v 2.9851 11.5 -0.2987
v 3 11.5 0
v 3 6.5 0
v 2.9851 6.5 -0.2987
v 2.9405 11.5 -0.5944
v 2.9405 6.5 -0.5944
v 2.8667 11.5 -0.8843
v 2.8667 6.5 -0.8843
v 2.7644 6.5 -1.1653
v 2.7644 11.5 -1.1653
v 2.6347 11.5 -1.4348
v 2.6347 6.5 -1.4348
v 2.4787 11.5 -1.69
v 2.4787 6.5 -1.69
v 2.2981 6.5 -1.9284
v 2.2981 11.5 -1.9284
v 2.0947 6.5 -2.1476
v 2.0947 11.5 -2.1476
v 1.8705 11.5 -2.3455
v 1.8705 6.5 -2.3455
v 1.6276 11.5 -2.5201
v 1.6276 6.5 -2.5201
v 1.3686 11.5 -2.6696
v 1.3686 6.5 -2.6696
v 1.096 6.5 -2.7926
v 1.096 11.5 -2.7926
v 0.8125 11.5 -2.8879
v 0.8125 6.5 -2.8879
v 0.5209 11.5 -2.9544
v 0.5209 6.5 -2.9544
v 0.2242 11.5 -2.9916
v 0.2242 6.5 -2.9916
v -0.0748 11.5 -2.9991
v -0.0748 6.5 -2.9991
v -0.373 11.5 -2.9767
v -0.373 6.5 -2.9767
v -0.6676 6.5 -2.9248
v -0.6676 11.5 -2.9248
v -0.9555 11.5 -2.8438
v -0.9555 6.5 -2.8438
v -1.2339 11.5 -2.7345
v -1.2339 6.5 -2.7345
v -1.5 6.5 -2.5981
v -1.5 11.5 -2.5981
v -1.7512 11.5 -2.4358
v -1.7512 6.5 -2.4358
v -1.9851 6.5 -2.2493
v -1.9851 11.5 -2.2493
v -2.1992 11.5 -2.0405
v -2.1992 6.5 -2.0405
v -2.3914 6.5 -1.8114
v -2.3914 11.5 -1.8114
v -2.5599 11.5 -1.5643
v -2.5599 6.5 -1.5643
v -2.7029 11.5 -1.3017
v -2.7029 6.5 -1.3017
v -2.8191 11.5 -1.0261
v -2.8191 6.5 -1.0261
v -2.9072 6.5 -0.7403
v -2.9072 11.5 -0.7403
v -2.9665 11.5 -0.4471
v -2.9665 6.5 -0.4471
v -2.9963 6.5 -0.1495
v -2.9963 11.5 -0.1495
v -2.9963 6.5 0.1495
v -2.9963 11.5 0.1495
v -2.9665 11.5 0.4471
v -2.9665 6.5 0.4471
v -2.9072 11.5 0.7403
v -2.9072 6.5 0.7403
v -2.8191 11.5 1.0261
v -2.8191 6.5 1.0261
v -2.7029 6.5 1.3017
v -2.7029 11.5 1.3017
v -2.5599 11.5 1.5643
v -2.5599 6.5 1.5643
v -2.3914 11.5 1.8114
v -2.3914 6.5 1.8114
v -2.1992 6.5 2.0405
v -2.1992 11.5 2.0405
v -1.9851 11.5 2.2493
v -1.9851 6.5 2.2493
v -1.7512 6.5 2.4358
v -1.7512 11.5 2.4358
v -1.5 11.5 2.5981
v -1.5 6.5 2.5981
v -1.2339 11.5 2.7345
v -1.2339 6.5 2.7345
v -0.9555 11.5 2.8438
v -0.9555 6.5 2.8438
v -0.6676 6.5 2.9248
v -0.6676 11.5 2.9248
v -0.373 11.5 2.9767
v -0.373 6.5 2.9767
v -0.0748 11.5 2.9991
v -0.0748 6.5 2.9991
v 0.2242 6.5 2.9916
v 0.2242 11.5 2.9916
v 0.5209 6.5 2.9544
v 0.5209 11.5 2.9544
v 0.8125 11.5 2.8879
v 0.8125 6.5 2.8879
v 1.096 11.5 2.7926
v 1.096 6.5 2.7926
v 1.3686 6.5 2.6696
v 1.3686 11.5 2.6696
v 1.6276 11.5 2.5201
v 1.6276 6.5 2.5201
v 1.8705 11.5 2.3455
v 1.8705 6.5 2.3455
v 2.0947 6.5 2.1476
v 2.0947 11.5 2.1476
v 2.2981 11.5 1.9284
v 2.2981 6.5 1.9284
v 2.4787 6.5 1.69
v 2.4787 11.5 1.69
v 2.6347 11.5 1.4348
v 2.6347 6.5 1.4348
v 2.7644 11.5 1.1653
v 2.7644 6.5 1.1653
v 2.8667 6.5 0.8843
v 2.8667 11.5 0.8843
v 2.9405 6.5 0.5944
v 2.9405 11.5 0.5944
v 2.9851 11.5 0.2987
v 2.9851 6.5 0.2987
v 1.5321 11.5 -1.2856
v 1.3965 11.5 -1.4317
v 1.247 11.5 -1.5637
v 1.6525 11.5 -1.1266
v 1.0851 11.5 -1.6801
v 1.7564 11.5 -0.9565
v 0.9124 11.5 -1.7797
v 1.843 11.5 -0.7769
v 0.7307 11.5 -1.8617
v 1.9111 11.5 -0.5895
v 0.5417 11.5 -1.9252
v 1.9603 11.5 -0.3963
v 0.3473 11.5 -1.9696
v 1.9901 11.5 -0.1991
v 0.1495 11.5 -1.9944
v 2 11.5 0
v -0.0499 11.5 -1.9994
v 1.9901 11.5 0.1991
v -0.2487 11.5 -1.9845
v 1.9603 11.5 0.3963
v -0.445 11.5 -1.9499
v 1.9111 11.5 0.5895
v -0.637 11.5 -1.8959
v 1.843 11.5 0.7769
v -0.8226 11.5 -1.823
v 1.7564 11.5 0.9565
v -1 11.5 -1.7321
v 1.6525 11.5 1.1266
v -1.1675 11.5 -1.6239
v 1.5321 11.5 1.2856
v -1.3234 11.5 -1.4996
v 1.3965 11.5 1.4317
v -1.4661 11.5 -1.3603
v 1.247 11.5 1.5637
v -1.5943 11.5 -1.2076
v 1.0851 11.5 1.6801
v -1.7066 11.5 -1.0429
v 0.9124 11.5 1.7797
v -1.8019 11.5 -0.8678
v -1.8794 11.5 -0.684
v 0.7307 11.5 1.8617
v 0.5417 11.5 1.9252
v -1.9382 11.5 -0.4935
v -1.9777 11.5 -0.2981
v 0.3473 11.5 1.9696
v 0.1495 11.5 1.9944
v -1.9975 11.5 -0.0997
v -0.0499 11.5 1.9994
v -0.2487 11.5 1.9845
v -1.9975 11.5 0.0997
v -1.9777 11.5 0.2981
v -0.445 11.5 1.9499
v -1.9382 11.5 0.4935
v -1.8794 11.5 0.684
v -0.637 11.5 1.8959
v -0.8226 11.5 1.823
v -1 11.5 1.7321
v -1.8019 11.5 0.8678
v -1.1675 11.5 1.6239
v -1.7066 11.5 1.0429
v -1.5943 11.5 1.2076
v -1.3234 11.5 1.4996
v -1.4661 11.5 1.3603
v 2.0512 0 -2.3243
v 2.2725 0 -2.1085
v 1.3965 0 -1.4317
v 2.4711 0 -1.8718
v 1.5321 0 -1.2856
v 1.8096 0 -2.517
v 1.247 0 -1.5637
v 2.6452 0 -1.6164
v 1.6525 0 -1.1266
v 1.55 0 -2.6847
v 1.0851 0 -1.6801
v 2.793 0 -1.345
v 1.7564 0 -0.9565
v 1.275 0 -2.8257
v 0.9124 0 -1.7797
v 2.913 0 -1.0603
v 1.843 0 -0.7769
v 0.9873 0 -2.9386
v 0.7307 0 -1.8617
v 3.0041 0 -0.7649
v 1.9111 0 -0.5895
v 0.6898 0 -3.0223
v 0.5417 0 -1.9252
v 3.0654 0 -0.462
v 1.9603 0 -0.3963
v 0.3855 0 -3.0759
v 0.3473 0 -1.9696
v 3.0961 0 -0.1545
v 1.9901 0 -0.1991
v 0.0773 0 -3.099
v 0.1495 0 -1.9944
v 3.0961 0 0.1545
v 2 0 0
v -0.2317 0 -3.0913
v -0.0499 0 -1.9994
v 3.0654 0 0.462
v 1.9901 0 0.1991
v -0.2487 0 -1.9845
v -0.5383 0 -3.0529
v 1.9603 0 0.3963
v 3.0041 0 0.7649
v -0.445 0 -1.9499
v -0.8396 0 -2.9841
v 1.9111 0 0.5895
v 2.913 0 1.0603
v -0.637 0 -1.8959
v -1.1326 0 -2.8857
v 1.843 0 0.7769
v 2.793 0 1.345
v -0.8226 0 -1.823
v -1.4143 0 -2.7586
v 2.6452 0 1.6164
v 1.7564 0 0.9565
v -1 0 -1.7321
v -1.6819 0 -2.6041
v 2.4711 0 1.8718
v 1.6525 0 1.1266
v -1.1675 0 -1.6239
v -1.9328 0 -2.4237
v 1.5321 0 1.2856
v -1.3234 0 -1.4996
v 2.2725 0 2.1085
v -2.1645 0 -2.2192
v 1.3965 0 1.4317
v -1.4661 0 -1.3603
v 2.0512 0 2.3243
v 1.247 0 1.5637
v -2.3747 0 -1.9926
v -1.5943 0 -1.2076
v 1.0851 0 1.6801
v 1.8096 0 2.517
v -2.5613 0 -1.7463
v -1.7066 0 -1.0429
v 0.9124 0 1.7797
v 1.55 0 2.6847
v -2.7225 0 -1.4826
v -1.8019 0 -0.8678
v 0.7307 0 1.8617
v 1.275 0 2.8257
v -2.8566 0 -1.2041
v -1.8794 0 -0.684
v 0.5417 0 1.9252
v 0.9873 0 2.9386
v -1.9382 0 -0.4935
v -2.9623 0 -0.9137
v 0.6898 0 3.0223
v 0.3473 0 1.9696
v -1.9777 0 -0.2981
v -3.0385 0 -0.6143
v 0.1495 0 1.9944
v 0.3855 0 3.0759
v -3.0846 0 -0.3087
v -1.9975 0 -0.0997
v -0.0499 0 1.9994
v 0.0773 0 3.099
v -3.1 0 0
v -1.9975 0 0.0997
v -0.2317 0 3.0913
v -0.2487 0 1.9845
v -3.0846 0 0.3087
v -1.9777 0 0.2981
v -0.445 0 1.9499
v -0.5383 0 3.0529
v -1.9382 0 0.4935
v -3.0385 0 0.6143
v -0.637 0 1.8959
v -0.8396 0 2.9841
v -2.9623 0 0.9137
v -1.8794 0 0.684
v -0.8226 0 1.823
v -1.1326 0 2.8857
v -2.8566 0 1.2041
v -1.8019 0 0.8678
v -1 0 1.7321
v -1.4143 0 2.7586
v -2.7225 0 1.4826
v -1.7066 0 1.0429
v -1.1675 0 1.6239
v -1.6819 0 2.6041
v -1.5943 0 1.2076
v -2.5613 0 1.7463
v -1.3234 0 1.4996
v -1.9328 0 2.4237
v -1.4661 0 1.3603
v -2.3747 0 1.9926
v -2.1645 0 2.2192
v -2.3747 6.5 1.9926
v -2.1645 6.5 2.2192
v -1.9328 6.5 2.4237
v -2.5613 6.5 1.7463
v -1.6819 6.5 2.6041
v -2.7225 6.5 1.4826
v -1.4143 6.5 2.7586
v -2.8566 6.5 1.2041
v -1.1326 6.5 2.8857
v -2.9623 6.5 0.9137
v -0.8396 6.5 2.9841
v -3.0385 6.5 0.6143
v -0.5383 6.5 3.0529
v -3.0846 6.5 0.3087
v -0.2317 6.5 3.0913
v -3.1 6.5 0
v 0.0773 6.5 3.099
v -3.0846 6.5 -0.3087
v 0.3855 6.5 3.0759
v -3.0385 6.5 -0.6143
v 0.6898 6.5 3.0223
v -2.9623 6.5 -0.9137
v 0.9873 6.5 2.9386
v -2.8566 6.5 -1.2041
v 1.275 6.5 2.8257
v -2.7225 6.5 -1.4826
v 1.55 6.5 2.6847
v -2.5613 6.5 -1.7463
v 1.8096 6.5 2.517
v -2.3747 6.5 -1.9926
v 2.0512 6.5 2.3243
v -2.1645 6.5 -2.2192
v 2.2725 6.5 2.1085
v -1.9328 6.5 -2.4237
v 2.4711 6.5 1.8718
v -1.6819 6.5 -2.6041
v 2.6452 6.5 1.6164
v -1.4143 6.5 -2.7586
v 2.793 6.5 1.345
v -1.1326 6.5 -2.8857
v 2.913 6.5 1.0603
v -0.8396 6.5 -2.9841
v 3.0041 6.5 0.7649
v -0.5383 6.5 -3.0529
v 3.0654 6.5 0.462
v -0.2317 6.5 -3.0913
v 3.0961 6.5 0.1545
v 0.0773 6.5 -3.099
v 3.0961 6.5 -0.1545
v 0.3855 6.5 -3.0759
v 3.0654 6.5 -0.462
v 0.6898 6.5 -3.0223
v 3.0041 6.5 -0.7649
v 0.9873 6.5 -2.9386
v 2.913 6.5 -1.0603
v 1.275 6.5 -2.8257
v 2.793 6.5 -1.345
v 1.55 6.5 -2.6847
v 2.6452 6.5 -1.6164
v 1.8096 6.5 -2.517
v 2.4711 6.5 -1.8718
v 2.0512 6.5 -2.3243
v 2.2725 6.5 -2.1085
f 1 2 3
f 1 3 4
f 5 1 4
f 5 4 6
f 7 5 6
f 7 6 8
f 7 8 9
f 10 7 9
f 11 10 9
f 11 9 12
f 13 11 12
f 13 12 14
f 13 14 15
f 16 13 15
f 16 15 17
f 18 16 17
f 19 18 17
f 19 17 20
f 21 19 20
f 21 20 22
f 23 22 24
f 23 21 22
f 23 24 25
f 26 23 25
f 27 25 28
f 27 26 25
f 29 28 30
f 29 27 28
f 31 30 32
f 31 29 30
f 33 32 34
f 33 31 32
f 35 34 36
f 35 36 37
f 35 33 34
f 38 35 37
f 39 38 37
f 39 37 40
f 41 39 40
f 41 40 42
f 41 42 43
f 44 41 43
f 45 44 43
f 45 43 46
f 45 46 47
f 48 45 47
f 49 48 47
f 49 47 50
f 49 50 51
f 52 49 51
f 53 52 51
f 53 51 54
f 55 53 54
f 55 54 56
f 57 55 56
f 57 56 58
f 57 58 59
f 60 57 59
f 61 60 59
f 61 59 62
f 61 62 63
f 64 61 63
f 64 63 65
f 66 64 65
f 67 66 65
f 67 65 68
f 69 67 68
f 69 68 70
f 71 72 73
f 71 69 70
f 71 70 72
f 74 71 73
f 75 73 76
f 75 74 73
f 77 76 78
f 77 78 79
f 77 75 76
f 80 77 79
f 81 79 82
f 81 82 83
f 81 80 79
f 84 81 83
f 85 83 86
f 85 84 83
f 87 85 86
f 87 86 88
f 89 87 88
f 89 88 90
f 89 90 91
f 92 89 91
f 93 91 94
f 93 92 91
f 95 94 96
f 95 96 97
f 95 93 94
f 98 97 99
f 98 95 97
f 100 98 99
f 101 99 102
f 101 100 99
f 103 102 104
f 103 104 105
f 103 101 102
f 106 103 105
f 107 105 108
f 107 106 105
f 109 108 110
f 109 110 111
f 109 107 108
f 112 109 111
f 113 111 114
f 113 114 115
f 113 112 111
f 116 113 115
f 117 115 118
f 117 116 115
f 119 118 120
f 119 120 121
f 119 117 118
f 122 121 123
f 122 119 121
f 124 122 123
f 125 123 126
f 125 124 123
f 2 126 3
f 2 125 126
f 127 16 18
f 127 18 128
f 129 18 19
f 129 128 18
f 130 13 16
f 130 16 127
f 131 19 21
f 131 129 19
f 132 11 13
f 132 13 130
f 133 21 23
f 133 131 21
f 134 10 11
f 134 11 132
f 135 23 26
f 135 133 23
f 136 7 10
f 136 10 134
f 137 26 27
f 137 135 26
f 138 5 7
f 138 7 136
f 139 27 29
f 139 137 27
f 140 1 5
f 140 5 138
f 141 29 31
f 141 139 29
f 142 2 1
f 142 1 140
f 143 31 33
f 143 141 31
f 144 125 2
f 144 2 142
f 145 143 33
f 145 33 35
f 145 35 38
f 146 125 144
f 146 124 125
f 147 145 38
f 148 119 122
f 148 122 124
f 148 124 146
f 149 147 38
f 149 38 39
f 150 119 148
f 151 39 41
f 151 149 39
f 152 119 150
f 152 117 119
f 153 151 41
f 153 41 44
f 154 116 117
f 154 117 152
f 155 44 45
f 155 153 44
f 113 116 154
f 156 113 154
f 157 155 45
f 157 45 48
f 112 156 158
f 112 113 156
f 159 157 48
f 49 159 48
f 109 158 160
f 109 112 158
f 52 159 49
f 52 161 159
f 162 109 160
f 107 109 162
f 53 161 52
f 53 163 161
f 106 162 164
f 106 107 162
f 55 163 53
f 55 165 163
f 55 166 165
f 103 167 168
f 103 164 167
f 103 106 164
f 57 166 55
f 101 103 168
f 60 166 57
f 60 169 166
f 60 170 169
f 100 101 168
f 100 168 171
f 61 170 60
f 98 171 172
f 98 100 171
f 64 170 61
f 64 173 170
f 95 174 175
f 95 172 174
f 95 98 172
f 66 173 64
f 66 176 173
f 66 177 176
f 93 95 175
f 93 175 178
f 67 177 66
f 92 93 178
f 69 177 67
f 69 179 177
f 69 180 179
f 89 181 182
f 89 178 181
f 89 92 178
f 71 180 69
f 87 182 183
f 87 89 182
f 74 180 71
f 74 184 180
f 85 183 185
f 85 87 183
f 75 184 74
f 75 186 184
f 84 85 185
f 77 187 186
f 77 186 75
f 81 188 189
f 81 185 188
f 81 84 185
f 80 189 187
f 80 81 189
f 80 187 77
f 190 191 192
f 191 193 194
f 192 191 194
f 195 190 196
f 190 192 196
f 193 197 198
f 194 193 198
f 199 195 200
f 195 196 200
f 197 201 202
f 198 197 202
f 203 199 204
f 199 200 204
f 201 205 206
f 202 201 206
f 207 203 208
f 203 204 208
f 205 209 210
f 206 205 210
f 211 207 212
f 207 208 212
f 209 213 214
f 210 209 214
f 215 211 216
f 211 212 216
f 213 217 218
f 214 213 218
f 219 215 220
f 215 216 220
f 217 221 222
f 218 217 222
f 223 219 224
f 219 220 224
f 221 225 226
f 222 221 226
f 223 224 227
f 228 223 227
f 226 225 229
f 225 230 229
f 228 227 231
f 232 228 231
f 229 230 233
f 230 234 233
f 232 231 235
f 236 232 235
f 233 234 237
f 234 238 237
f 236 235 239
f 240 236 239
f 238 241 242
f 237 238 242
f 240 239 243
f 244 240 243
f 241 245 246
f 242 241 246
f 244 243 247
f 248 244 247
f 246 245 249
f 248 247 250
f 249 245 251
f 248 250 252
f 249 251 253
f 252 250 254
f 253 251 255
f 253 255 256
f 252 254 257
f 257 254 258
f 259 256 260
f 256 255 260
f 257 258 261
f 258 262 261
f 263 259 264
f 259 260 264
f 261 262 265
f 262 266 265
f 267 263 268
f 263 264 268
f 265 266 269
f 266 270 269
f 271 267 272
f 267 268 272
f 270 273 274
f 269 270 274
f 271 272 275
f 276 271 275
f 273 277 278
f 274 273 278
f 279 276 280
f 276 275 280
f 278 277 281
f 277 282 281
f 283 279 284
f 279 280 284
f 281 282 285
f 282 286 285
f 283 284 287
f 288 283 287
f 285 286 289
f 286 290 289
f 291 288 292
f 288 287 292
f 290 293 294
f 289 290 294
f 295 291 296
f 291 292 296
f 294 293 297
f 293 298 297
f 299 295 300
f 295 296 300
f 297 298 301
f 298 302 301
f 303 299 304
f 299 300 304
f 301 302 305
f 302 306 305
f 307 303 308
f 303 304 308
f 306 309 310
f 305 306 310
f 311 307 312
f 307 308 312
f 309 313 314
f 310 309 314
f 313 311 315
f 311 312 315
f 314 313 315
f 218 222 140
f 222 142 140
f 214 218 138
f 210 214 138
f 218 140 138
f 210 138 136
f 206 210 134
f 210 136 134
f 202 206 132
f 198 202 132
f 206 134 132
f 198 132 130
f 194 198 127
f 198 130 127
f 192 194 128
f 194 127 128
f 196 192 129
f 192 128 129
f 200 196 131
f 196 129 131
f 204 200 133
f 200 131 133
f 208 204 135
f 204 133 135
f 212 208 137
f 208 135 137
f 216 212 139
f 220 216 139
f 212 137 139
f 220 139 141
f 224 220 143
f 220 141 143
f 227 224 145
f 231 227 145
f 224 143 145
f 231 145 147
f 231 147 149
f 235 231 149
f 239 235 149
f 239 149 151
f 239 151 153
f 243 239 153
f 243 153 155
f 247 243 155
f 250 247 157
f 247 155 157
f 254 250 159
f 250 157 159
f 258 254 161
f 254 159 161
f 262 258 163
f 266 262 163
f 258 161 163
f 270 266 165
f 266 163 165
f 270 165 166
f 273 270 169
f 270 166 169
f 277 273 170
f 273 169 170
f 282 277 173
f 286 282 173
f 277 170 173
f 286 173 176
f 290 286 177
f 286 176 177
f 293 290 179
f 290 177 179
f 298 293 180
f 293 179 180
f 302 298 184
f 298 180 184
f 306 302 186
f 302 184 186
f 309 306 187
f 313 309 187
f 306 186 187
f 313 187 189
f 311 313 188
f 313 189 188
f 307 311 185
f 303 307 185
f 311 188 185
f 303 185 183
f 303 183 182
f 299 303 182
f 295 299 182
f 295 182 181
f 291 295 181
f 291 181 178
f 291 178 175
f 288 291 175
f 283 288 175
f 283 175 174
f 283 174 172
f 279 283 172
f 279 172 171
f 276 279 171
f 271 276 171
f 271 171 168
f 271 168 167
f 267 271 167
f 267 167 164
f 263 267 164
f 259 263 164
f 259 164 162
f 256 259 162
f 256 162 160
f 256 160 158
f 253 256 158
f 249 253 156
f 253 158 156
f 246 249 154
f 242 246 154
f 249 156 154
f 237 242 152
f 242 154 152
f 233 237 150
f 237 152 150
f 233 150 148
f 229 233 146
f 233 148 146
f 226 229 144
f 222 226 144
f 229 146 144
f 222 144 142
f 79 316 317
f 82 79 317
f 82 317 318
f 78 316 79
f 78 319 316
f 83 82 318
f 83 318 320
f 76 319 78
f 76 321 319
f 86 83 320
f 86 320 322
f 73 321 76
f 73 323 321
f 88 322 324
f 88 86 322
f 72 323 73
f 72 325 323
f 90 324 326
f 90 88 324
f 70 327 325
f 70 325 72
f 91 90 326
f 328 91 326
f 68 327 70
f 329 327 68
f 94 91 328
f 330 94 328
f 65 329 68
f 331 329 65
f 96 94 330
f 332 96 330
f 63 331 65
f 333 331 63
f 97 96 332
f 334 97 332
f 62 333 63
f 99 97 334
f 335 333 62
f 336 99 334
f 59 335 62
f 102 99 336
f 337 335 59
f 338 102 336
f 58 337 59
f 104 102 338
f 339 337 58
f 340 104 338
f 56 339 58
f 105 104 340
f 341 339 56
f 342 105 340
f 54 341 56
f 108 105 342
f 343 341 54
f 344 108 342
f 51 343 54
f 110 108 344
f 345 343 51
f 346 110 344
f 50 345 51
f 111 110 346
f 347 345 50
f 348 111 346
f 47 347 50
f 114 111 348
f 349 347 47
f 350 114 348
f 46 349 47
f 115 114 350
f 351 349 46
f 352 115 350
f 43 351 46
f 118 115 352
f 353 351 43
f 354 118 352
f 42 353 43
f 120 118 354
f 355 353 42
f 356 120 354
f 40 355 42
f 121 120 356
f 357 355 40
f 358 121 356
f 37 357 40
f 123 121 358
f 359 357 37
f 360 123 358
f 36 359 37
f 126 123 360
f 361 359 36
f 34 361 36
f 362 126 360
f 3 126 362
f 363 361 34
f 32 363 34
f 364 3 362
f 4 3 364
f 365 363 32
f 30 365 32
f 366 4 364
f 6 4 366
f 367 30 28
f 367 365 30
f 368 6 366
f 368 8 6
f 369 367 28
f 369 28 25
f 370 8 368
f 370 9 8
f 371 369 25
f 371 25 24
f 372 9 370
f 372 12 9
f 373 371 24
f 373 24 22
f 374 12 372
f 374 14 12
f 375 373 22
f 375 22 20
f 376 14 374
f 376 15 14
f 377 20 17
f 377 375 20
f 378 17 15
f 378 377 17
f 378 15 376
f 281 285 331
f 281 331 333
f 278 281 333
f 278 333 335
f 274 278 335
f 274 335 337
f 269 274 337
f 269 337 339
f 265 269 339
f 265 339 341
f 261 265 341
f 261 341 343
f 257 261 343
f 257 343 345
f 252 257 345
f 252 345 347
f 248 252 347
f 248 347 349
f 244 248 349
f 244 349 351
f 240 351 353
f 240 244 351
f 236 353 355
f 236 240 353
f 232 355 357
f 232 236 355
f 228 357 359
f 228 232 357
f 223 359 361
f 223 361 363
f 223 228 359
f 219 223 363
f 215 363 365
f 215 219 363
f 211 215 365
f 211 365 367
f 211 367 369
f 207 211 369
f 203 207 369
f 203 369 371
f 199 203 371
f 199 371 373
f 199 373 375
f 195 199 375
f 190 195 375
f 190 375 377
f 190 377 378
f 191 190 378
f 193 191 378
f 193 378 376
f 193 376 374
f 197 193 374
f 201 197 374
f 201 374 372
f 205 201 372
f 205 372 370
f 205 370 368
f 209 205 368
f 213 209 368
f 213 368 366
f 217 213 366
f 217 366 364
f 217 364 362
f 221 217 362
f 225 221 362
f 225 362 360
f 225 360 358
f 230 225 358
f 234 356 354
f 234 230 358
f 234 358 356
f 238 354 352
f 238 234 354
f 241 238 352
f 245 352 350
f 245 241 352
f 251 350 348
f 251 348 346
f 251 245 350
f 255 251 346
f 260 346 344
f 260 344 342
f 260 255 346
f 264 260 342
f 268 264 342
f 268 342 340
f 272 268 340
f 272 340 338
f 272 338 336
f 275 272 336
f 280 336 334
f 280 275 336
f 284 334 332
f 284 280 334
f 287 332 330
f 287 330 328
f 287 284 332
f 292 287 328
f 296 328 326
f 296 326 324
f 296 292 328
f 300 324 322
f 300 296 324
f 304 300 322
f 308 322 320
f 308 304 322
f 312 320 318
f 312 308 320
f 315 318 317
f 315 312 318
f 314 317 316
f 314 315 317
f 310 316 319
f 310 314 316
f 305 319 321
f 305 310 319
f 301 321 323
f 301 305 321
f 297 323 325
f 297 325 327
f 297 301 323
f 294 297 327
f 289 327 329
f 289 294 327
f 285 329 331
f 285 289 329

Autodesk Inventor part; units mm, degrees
ref_plane "YZ Plane" through (0, 0, 0) normal (1, 0, 0) x (0, 1, 0)
ref_plane "XZ Plane" through (0, 0, 0) normal (0, 1, 0) x (-1, 0, 0)
ref_plane "XY Plane" through (0, 0, 0) normal (0, 0, 1) x (1, 0, 0)
sketch "Boceto1" plane through (0, 0, 0) normal (0, 1, 0) x (-1, 0, 0)
  circle A0 centre (0, 0) radius 3.1
  dimension "d0" = 6.2
extrude "Extrusión1" add sketch "Boceto1" along normal blind 11.5
sketch "Boceto2" plane through (0, 11.5, 0) normal (0, 1, 0) x (1, 0, 0)
  circle A0 centre (0, 0) radius 3.1 projected
  circle A1 centre (0, 0) radius 2
  dimension "d3" = 4
extrude "Extrusión2" cut sketch "Boceto2" against normal blind 15.75 contours A1
sketch "Boceto3" plane through (0, 11.5, 0) normal (0, 1, 0) x (1, 0, 0)
  circle A0 centre (0, 0) radius 3
  circle A1 centre (0, 0) radius 4.9518
  dimension "d6" = 6
extrude "Extrusión3" cut sketch "Boceto3" against normal blind 5
equation "\"Radio_pliegue\" = Grosor"
equation "\"Anchura_desahogo_plegado\" = Grosor"
equation "\"Profundidad_desahogo_plegado\" = 0.5 * Grosor"
equation "\"Tamaño_destalonado\" = 4 * Grosor"
equation "\"Remanente_mínimo\" = 2 * Grosor"
equation "\"Radiodetransición\" = Radio_pliegue"
equation "\"Tamaño_de_radio_de_Jacobi\" = Radio_pliegue"
equation "\"TamañoSeparación\" = Grosor"
equation "\"Grosor\" = 0.5"
properties part number "Soporte de llanta"
